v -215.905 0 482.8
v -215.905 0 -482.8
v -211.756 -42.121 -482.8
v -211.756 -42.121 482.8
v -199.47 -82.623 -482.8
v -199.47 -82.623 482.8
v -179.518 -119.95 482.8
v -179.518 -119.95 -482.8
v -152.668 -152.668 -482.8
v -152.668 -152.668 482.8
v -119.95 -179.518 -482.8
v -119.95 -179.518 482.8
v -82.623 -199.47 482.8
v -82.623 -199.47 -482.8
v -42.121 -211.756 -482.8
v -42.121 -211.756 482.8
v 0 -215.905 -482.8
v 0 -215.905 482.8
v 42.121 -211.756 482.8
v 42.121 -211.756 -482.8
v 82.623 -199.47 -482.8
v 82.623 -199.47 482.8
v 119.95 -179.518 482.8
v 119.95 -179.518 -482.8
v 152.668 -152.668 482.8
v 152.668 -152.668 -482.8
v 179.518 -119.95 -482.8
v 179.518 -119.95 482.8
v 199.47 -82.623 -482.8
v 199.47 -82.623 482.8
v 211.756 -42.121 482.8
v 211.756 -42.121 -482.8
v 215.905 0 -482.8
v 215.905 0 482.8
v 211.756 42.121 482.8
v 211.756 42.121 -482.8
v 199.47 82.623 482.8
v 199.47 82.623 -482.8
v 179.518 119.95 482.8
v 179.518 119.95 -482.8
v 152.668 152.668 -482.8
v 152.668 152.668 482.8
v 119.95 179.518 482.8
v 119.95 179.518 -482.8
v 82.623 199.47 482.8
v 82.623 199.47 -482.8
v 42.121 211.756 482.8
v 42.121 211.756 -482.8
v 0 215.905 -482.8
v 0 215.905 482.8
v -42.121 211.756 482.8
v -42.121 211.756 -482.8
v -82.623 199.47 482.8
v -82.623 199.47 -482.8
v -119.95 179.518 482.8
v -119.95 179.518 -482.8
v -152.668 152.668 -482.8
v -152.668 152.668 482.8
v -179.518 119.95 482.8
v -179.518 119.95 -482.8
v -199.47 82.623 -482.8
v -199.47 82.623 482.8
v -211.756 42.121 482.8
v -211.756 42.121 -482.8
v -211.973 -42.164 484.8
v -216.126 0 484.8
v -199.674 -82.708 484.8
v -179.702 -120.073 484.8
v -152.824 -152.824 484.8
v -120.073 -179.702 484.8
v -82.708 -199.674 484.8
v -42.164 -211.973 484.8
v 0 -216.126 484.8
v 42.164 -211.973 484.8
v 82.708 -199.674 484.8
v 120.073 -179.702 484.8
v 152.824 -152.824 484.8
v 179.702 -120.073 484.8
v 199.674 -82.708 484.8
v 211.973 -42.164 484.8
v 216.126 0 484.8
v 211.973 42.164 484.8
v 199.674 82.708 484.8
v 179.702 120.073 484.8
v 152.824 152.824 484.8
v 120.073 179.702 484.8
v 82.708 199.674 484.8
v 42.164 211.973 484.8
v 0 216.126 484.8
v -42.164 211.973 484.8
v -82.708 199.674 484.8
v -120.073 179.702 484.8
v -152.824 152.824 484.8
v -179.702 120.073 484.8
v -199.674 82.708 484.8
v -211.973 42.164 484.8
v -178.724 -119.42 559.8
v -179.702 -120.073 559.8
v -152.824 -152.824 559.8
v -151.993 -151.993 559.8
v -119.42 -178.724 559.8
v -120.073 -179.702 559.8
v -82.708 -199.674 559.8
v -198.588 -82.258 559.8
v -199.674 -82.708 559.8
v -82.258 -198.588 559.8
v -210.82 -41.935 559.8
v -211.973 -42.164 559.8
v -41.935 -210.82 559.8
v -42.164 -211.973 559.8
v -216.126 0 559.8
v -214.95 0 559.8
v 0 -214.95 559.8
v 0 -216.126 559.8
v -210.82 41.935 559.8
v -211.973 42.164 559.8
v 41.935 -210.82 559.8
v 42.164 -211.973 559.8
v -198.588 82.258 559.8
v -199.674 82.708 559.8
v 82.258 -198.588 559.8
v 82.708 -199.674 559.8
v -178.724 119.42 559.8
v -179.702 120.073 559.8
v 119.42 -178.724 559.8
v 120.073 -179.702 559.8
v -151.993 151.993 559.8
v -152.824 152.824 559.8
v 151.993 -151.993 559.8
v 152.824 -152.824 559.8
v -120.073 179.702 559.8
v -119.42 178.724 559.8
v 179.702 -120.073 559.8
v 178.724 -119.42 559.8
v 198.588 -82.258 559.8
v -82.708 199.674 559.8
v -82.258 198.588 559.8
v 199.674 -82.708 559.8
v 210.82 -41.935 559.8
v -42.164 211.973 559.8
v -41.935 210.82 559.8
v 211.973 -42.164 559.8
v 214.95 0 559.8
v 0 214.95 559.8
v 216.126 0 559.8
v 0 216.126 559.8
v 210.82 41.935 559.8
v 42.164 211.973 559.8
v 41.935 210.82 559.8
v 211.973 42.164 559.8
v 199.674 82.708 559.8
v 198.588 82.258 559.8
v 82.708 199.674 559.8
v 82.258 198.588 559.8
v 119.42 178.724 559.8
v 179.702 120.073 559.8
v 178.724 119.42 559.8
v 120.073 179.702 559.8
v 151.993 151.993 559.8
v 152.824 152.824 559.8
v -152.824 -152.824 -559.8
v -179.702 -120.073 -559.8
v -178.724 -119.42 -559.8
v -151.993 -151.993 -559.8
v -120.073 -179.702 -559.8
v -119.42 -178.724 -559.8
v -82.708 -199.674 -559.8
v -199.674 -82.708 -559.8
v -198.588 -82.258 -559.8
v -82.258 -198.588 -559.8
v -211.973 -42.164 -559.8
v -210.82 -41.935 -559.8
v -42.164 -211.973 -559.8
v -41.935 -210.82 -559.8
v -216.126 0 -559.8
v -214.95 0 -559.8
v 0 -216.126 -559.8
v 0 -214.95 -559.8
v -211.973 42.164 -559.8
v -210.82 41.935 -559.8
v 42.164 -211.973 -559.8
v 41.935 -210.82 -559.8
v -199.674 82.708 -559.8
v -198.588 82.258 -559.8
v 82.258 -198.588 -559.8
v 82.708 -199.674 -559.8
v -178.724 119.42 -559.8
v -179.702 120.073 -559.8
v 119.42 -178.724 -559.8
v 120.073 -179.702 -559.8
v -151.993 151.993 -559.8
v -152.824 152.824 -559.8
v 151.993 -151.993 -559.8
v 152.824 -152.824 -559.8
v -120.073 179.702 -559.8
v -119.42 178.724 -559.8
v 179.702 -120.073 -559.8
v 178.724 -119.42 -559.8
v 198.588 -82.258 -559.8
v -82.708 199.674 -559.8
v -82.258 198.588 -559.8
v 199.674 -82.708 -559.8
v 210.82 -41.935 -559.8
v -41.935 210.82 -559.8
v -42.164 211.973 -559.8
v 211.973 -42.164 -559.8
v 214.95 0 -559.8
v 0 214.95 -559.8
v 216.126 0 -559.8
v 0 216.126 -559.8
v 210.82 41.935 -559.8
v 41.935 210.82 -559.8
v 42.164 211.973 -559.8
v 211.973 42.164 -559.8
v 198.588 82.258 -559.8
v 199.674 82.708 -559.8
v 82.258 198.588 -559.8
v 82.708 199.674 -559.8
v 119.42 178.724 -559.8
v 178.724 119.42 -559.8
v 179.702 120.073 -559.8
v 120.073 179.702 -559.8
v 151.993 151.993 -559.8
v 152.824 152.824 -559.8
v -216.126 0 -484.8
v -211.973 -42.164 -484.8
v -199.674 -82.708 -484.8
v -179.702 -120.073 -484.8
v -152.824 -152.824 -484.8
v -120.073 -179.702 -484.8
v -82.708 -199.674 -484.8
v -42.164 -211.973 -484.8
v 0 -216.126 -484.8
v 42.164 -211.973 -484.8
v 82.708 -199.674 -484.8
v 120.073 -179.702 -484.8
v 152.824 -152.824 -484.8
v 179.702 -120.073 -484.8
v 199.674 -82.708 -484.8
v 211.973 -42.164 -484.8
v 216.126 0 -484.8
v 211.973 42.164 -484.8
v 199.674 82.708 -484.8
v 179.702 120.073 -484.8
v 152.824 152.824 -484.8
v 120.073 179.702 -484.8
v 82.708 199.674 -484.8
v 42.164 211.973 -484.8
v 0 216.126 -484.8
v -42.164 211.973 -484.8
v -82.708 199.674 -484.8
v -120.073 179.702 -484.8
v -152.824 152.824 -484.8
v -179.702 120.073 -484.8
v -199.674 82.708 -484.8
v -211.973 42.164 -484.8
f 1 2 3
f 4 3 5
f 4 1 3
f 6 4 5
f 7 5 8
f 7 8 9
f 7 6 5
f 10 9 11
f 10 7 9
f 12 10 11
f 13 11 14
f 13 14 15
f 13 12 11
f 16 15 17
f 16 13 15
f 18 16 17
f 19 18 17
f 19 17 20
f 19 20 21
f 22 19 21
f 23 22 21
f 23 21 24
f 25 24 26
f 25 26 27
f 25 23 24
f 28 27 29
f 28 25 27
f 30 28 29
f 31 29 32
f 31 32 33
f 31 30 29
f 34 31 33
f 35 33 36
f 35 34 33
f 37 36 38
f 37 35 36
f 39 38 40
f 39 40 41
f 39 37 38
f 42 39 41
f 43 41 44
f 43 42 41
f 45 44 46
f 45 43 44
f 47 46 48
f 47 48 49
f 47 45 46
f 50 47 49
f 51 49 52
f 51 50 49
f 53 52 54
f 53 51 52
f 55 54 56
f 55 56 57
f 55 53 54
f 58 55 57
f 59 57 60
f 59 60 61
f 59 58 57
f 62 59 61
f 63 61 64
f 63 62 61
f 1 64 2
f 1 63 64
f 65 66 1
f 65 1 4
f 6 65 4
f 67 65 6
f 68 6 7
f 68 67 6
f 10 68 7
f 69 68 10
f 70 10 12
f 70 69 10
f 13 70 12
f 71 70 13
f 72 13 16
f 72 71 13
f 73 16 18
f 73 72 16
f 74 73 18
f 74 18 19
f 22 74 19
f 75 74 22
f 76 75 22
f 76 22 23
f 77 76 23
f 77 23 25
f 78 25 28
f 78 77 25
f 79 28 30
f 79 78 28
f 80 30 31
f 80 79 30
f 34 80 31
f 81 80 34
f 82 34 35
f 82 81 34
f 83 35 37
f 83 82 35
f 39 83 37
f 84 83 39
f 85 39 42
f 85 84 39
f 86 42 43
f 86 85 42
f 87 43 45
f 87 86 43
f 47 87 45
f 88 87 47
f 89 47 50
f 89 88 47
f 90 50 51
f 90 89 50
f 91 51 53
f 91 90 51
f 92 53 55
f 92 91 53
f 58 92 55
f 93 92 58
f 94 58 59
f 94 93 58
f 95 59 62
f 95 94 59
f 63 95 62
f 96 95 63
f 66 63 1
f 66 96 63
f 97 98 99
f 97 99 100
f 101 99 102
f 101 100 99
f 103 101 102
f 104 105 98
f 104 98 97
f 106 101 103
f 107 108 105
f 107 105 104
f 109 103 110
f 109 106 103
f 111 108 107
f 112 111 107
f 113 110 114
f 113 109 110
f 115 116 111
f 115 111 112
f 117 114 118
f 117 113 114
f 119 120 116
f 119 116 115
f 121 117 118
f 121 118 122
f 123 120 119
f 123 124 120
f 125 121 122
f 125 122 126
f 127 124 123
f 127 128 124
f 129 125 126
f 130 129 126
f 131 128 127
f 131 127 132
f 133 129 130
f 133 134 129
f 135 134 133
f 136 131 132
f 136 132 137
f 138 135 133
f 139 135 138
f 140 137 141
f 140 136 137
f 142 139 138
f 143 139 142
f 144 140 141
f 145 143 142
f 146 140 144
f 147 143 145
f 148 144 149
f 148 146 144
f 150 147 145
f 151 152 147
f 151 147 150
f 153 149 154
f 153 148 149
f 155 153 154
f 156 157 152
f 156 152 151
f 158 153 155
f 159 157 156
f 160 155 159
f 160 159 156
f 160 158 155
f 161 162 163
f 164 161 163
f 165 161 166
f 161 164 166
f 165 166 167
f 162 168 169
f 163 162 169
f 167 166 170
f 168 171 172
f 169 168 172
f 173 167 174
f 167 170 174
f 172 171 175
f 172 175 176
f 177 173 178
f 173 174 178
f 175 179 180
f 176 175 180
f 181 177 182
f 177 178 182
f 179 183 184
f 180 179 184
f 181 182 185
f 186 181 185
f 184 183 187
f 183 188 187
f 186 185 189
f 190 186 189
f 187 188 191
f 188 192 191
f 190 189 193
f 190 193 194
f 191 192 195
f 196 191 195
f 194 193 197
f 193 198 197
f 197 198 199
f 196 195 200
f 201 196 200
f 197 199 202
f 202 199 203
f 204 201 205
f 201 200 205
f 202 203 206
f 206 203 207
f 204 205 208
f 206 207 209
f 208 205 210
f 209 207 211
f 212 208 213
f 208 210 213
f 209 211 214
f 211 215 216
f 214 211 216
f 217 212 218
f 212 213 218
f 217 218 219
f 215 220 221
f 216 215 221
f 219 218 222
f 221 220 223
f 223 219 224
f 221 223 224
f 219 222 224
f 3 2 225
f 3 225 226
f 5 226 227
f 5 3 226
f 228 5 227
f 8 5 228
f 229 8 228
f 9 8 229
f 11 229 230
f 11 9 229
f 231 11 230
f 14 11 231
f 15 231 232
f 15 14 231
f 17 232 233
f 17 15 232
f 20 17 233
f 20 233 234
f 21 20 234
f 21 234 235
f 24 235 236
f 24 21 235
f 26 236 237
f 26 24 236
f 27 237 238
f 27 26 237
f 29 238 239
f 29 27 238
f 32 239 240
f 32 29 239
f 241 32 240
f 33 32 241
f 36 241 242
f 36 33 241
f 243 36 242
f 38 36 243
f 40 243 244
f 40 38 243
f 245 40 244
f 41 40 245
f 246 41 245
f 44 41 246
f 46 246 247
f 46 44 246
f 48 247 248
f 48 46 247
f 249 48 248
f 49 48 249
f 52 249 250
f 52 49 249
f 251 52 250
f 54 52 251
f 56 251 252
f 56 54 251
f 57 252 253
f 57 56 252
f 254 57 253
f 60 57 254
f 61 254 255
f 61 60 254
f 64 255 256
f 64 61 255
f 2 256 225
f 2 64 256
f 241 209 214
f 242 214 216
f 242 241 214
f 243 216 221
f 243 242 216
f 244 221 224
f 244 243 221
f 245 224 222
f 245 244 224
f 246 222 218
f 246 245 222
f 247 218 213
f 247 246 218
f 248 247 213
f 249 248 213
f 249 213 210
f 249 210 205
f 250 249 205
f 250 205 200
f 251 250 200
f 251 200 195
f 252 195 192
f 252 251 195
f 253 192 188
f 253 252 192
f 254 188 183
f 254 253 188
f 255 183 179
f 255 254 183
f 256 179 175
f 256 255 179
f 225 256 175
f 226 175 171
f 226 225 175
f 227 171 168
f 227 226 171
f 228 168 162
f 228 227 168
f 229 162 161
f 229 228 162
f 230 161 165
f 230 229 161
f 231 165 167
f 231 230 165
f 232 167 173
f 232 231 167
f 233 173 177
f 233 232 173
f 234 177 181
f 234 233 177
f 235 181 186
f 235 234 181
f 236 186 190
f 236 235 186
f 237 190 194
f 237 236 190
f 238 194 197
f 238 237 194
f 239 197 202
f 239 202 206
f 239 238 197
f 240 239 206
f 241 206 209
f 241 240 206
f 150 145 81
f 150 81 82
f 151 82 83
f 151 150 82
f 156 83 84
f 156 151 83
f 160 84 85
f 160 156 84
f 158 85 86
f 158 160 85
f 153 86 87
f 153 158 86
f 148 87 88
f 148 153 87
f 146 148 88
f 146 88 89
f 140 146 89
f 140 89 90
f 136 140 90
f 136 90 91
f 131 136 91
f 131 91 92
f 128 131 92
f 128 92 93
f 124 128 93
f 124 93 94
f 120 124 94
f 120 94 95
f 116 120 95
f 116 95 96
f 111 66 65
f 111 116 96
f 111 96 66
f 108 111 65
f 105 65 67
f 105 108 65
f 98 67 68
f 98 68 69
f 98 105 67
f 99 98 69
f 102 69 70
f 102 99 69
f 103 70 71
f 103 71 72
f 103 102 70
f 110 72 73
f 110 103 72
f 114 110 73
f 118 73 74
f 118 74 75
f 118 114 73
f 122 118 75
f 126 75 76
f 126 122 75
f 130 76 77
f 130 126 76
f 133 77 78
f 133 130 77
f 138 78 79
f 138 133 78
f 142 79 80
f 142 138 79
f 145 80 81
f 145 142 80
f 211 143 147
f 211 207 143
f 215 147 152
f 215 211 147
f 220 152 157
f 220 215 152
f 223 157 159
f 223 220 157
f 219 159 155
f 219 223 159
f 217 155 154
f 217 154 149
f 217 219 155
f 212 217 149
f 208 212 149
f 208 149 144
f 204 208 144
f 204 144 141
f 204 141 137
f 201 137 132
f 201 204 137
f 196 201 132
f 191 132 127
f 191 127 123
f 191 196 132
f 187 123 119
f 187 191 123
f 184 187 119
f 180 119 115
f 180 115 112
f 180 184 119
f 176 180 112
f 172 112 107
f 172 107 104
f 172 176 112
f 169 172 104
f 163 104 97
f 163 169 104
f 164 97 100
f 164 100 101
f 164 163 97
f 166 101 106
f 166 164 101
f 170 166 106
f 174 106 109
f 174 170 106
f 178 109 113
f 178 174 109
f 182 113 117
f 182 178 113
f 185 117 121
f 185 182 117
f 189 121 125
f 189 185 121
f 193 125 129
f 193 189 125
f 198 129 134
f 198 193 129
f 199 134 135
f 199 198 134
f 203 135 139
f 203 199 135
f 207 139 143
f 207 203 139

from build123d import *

# Parameters (mm, degrees)
SKETCH1_R      = 216.126
SKETCH1_R_2    = 214.95
EXTRUDE1_DEPTH = 559.8


with BuildPart() as part:
    # Sketch1 → Extrude1 (new body, symmetric)
    with BuildSketch(Plane.XY):
        Circle(SKETCH1_R)
        Circle(SKETCH1_R_2, mode=Mode.SUBTRACT)
    extrude(amount=EXTRUDE1_DEPTH, both=True)

    # Sketch2 → Cut-Revolve1 (revolve, cut)
    with BuildSketch(Plane(origin=(0, 0, 0), x_dir=(1, 0, 0), z_dir=(0, 1, 0)), mode=Mode.PRIVATE) as cut_revolve1_sk:
        Polygon((216.126, 484.8), (215.905, 482.8), (215.905, -482.8), (216.126, -484.8), align=None)
    revolve(cut_revolve1_sk.sketch.rotate(Axis((0, 0, -624.558028957), (0, 0, 1)), 180), axis=Axis((0, 0, -624.558028957), (0, 0, 1)), mode=Mode.SUBTRACT)  # turned: the seam where the file's is


solid = part.part
